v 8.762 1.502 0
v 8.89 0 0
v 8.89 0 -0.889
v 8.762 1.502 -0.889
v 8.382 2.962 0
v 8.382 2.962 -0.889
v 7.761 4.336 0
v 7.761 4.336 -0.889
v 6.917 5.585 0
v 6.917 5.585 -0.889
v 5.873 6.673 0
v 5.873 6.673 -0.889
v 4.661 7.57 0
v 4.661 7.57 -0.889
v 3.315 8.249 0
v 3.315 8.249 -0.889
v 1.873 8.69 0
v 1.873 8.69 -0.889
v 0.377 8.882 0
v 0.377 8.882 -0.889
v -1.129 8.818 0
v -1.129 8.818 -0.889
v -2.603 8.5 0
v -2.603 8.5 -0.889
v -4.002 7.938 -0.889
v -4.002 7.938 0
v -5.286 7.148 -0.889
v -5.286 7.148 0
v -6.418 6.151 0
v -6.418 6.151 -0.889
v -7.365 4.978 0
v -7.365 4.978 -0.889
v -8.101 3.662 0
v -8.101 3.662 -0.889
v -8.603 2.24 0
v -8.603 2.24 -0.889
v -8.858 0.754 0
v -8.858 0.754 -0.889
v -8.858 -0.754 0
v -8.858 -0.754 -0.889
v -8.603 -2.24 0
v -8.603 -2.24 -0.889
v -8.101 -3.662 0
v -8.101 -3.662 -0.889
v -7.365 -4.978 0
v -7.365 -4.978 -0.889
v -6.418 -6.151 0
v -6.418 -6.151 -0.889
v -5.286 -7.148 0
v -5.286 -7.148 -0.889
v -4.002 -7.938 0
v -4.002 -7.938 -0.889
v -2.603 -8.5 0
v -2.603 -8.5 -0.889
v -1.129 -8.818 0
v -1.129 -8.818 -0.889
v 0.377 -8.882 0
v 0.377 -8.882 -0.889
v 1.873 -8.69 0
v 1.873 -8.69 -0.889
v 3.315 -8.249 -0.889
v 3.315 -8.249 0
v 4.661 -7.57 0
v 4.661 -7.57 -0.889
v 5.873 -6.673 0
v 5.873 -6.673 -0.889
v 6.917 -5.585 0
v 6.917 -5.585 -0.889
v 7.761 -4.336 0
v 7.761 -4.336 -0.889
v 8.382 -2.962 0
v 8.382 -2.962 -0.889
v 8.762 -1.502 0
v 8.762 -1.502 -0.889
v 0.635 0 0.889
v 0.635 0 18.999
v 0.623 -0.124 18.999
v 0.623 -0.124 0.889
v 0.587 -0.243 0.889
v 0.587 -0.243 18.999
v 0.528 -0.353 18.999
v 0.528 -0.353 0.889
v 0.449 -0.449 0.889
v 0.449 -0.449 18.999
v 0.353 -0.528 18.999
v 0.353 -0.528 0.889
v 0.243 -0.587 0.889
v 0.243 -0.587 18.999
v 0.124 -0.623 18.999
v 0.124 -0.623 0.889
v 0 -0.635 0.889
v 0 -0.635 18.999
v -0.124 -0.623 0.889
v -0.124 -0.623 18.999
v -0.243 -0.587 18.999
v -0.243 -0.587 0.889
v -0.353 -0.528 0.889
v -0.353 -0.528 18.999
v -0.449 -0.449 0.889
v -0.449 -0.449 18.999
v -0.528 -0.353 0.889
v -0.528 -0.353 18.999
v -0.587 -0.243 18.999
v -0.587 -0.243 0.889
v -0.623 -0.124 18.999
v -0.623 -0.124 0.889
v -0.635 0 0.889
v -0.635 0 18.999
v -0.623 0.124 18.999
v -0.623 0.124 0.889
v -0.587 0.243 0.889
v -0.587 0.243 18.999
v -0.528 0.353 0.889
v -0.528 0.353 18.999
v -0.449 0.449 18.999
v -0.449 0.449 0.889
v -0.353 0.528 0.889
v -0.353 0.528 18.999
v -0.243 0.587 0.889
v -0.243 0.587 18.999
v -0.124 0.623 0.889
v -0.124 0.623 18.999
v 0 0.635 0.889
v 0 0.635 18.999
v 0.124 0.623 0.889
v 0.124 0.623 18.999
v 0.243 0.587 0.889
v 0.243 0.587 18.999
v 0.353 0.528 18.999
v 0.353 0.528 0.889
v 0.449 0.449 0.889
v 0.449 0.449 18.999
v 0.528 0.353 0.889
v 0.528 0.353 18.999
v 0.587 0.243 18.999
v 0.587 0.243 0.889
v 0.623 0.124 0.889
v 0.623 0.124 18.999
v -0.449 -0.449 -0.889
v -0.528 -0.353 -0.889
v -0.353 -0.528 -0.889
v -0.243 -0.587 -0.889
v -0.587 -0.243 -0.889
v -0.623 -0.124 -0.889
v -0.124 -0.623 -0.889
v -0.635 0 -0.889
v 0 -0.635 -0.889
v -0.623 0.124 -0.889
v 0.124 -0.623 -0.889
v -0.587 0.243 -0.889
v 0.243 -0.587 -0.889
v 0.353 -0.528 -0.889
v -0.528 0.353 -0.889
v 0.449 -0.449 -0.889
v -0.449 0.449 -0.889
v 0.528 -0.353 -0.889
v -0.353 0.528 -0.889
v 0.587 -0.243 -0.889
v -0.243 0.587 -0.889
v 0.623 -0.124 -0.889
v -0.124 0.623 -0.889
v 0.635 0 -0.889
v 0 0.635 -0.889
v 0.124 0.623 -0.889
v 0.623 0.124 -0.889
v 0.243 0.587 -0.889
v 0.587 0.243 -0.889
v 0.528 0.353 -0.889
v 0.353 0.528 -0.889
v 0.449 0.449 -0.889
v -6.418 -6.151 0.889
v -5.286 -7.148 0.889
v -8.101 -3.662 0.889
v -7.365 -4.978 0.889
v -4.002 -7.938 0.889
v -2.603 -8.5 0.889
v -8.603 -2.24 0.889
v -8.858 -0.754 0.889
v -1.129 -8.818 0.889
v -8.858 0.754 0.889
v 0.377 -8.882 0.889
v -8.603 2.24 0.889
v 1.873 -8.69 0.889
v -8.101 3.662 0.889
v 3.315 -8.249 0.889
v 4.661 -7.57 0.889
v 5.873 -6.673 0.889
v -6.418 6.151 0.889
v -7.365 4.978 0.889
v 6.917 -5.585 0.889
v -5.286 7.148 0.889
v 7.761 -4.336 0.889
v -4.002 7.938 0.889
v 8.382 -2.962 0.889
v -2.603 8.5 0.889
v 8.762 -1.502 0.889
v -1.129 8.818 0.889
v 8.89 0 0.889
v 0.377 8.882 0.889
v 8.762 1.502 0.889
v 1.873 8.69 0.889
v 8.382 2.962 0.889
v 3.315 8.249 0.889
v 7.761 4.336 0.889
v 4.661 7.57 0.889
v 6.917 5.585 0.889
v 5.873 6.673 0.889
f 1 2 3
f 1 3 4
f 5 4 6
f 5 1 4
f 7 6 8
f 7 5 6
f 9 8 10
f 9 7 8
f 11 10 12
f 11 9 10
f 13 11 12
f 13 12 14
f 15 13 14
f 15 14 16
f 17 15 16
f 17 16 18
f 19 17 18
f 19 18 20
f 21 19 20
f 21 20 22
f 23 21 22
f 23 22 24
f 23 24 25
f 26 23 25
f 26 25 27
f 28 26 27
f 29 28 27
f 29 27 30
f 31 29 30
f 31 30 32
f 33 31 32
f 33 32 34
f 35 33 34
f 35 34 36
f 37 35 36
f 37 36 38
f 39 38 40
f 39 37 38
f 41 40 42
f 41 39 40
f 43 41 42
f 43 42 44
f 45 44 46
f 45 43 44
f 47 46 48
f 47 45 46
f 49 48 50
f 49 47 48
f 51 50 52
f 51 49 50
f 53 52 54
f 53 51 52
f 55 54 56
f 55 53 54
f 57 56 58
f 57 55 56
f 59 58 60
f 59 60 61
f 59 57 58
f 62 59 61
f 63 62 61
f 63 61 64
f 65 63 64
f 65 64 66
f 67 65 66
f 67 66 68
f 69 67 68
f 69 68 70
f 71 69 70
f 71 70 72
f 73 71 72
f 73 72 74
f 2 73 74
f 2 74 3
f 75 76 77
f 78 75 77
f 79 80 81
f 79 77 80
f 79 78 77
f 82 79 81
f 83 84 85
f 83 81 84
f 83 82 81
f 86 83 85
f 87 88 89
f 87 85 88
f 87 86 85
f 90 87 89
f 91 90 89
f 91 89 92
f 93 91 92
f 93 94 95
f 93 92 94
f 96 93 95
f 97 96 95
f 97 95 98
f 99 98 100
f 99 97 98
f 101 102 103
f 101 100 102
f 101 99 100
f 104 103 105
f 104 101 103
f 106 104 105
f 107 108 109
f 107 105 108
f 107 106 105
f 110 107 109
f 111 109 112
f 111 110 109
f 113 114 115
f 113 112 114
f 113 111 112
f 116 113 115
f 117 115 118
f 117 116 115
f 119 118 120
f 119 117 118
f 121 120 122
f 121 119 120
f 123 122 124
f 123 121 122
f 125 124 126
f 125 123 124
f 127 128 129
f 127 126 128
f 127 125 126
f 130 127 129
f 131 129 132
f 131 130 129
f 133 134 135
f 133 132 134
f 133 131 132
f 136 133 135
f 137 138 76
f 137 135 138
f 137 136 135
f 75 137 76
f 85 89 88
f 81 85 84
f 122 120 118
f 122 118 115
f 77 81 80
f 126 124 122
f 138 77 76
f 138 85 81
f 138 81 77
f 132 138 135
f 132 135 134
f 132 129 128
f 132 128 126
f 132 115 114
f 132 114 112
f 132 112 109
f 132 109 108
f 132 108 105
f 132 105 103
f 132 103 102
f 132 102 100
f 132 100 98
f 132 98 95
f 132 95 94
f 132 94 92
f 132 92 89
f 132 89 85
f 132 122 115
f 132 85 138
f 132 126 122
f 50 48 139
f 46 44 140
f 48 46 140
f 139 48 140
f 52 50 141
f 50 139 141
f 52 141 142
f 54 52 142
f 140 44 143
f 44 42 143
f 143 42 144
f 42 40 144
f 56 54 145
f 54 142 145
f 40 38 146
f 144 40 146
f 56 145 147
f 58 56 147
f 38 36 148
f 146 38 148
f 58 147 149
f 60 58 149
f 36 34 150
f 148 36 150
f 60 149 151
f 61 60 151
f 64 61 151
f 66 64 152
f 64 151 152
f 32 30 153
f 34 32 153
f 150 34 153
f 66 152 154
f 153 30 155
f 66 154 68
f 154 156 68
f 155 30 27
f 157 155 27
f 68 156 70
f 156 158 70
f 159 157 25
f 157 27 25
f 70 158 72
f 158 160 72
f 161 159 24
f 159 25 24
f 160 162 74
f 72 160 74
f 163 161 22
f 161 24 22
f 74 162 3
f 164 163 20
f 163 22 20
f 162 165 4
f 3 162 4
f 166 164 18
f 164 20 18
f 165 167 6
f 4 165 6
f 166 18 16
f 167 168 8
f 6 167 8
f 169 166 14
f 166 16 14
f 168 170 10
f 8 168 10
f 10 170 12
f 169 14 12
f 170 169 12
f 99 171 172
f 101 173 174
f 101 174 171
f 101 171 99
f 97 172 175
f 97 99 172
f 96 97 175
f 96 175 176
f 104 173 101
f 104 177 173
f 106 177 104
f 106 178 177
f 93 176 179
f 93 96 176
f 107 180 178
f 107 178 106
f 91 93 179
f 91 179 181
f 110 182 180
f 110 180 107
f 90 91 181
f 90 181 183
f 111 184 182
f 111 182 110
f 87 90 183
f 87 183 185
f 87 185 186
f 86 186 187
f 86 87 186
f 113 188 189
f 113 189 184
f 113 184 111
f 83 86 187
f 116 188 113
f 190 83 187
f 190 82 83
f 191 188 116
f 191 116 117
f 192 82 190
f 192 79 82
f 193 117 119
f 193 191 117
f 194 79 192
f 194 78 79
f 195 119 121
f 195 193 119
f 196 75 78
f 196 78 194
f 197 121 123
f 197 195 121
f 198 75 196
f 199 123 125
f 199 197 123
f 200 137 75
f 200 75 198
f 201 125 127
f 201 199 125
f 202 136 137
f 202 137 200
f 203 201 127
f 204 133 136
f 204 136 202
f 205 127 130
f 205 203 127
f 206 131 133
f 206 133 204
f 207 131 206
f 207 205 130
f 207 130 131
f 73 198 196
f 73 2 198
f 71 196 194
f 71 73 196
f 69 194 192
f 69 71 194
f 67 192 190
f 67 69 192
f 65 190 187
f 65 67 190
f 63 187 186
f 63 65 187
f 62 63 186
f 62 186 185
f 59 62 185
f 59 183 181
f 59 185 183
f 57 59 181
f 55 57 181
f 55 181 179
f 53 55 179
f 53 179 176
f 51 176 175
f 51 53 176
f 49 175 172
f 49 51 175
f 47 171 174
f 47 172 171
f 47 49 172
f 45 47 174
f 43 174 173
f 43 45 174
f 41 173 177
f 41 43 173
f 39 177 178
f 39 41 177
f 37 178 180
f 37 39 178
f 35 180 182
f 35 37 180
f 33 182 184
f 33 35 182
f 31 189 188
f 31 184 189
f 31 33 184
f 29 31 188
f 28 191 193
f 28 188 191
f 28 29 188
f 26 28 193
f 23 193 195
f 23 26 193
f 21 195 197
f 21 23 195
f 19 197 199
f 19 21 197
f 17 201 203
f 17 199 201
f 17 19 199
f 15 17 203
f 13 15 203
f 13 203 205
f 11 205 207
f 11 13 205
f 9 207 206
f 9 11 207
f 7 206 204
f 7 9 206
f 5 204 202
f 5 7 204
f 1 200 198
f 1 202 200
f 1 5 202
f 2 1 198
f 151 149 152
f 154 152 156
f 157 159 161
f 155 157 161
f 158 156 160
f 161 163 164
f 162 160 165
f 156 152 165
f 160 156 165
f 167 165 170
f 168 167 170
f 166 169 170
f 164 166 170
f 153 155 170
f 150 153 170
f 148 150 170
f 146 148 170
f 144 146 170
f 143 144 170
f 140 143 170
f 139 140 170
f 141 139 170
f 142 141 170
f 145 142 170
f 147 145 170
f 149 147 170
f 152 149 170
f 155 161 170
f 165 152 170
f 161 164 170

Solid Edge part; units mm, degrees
sketch "Sketch1" plane through (0, 0, 0) normal (0, 0, 1) x (1, 0, 0)
  circle A0 centre (0, 0) radius 8.89
  circle A1 centre (0, 0) radius 0.635
  dimension "D1" = 17.78
extrude "Protrusion1" add sketch "Sketch1" along normal mid plane 1.778
sketch "Sketch2" plane through (0, 0, 0) normal (0, 0, 1) x (1, 0, 0)
  circle A0 centre (0, 0) radius 0.635
extrude "Protrusion2" add sketch "Sketch2" along normal blind 18.9992
sketch "Sketch3" plane through (0, 0, 0) normal (0, 0, 1) x (1, 0, 0)
  circle A0 centre (0, 0) radius 0.635
extrude "Protrusion3" add sketch "Sketch3" along normal up to surface (0.889 mm away) from surface at -0.889
